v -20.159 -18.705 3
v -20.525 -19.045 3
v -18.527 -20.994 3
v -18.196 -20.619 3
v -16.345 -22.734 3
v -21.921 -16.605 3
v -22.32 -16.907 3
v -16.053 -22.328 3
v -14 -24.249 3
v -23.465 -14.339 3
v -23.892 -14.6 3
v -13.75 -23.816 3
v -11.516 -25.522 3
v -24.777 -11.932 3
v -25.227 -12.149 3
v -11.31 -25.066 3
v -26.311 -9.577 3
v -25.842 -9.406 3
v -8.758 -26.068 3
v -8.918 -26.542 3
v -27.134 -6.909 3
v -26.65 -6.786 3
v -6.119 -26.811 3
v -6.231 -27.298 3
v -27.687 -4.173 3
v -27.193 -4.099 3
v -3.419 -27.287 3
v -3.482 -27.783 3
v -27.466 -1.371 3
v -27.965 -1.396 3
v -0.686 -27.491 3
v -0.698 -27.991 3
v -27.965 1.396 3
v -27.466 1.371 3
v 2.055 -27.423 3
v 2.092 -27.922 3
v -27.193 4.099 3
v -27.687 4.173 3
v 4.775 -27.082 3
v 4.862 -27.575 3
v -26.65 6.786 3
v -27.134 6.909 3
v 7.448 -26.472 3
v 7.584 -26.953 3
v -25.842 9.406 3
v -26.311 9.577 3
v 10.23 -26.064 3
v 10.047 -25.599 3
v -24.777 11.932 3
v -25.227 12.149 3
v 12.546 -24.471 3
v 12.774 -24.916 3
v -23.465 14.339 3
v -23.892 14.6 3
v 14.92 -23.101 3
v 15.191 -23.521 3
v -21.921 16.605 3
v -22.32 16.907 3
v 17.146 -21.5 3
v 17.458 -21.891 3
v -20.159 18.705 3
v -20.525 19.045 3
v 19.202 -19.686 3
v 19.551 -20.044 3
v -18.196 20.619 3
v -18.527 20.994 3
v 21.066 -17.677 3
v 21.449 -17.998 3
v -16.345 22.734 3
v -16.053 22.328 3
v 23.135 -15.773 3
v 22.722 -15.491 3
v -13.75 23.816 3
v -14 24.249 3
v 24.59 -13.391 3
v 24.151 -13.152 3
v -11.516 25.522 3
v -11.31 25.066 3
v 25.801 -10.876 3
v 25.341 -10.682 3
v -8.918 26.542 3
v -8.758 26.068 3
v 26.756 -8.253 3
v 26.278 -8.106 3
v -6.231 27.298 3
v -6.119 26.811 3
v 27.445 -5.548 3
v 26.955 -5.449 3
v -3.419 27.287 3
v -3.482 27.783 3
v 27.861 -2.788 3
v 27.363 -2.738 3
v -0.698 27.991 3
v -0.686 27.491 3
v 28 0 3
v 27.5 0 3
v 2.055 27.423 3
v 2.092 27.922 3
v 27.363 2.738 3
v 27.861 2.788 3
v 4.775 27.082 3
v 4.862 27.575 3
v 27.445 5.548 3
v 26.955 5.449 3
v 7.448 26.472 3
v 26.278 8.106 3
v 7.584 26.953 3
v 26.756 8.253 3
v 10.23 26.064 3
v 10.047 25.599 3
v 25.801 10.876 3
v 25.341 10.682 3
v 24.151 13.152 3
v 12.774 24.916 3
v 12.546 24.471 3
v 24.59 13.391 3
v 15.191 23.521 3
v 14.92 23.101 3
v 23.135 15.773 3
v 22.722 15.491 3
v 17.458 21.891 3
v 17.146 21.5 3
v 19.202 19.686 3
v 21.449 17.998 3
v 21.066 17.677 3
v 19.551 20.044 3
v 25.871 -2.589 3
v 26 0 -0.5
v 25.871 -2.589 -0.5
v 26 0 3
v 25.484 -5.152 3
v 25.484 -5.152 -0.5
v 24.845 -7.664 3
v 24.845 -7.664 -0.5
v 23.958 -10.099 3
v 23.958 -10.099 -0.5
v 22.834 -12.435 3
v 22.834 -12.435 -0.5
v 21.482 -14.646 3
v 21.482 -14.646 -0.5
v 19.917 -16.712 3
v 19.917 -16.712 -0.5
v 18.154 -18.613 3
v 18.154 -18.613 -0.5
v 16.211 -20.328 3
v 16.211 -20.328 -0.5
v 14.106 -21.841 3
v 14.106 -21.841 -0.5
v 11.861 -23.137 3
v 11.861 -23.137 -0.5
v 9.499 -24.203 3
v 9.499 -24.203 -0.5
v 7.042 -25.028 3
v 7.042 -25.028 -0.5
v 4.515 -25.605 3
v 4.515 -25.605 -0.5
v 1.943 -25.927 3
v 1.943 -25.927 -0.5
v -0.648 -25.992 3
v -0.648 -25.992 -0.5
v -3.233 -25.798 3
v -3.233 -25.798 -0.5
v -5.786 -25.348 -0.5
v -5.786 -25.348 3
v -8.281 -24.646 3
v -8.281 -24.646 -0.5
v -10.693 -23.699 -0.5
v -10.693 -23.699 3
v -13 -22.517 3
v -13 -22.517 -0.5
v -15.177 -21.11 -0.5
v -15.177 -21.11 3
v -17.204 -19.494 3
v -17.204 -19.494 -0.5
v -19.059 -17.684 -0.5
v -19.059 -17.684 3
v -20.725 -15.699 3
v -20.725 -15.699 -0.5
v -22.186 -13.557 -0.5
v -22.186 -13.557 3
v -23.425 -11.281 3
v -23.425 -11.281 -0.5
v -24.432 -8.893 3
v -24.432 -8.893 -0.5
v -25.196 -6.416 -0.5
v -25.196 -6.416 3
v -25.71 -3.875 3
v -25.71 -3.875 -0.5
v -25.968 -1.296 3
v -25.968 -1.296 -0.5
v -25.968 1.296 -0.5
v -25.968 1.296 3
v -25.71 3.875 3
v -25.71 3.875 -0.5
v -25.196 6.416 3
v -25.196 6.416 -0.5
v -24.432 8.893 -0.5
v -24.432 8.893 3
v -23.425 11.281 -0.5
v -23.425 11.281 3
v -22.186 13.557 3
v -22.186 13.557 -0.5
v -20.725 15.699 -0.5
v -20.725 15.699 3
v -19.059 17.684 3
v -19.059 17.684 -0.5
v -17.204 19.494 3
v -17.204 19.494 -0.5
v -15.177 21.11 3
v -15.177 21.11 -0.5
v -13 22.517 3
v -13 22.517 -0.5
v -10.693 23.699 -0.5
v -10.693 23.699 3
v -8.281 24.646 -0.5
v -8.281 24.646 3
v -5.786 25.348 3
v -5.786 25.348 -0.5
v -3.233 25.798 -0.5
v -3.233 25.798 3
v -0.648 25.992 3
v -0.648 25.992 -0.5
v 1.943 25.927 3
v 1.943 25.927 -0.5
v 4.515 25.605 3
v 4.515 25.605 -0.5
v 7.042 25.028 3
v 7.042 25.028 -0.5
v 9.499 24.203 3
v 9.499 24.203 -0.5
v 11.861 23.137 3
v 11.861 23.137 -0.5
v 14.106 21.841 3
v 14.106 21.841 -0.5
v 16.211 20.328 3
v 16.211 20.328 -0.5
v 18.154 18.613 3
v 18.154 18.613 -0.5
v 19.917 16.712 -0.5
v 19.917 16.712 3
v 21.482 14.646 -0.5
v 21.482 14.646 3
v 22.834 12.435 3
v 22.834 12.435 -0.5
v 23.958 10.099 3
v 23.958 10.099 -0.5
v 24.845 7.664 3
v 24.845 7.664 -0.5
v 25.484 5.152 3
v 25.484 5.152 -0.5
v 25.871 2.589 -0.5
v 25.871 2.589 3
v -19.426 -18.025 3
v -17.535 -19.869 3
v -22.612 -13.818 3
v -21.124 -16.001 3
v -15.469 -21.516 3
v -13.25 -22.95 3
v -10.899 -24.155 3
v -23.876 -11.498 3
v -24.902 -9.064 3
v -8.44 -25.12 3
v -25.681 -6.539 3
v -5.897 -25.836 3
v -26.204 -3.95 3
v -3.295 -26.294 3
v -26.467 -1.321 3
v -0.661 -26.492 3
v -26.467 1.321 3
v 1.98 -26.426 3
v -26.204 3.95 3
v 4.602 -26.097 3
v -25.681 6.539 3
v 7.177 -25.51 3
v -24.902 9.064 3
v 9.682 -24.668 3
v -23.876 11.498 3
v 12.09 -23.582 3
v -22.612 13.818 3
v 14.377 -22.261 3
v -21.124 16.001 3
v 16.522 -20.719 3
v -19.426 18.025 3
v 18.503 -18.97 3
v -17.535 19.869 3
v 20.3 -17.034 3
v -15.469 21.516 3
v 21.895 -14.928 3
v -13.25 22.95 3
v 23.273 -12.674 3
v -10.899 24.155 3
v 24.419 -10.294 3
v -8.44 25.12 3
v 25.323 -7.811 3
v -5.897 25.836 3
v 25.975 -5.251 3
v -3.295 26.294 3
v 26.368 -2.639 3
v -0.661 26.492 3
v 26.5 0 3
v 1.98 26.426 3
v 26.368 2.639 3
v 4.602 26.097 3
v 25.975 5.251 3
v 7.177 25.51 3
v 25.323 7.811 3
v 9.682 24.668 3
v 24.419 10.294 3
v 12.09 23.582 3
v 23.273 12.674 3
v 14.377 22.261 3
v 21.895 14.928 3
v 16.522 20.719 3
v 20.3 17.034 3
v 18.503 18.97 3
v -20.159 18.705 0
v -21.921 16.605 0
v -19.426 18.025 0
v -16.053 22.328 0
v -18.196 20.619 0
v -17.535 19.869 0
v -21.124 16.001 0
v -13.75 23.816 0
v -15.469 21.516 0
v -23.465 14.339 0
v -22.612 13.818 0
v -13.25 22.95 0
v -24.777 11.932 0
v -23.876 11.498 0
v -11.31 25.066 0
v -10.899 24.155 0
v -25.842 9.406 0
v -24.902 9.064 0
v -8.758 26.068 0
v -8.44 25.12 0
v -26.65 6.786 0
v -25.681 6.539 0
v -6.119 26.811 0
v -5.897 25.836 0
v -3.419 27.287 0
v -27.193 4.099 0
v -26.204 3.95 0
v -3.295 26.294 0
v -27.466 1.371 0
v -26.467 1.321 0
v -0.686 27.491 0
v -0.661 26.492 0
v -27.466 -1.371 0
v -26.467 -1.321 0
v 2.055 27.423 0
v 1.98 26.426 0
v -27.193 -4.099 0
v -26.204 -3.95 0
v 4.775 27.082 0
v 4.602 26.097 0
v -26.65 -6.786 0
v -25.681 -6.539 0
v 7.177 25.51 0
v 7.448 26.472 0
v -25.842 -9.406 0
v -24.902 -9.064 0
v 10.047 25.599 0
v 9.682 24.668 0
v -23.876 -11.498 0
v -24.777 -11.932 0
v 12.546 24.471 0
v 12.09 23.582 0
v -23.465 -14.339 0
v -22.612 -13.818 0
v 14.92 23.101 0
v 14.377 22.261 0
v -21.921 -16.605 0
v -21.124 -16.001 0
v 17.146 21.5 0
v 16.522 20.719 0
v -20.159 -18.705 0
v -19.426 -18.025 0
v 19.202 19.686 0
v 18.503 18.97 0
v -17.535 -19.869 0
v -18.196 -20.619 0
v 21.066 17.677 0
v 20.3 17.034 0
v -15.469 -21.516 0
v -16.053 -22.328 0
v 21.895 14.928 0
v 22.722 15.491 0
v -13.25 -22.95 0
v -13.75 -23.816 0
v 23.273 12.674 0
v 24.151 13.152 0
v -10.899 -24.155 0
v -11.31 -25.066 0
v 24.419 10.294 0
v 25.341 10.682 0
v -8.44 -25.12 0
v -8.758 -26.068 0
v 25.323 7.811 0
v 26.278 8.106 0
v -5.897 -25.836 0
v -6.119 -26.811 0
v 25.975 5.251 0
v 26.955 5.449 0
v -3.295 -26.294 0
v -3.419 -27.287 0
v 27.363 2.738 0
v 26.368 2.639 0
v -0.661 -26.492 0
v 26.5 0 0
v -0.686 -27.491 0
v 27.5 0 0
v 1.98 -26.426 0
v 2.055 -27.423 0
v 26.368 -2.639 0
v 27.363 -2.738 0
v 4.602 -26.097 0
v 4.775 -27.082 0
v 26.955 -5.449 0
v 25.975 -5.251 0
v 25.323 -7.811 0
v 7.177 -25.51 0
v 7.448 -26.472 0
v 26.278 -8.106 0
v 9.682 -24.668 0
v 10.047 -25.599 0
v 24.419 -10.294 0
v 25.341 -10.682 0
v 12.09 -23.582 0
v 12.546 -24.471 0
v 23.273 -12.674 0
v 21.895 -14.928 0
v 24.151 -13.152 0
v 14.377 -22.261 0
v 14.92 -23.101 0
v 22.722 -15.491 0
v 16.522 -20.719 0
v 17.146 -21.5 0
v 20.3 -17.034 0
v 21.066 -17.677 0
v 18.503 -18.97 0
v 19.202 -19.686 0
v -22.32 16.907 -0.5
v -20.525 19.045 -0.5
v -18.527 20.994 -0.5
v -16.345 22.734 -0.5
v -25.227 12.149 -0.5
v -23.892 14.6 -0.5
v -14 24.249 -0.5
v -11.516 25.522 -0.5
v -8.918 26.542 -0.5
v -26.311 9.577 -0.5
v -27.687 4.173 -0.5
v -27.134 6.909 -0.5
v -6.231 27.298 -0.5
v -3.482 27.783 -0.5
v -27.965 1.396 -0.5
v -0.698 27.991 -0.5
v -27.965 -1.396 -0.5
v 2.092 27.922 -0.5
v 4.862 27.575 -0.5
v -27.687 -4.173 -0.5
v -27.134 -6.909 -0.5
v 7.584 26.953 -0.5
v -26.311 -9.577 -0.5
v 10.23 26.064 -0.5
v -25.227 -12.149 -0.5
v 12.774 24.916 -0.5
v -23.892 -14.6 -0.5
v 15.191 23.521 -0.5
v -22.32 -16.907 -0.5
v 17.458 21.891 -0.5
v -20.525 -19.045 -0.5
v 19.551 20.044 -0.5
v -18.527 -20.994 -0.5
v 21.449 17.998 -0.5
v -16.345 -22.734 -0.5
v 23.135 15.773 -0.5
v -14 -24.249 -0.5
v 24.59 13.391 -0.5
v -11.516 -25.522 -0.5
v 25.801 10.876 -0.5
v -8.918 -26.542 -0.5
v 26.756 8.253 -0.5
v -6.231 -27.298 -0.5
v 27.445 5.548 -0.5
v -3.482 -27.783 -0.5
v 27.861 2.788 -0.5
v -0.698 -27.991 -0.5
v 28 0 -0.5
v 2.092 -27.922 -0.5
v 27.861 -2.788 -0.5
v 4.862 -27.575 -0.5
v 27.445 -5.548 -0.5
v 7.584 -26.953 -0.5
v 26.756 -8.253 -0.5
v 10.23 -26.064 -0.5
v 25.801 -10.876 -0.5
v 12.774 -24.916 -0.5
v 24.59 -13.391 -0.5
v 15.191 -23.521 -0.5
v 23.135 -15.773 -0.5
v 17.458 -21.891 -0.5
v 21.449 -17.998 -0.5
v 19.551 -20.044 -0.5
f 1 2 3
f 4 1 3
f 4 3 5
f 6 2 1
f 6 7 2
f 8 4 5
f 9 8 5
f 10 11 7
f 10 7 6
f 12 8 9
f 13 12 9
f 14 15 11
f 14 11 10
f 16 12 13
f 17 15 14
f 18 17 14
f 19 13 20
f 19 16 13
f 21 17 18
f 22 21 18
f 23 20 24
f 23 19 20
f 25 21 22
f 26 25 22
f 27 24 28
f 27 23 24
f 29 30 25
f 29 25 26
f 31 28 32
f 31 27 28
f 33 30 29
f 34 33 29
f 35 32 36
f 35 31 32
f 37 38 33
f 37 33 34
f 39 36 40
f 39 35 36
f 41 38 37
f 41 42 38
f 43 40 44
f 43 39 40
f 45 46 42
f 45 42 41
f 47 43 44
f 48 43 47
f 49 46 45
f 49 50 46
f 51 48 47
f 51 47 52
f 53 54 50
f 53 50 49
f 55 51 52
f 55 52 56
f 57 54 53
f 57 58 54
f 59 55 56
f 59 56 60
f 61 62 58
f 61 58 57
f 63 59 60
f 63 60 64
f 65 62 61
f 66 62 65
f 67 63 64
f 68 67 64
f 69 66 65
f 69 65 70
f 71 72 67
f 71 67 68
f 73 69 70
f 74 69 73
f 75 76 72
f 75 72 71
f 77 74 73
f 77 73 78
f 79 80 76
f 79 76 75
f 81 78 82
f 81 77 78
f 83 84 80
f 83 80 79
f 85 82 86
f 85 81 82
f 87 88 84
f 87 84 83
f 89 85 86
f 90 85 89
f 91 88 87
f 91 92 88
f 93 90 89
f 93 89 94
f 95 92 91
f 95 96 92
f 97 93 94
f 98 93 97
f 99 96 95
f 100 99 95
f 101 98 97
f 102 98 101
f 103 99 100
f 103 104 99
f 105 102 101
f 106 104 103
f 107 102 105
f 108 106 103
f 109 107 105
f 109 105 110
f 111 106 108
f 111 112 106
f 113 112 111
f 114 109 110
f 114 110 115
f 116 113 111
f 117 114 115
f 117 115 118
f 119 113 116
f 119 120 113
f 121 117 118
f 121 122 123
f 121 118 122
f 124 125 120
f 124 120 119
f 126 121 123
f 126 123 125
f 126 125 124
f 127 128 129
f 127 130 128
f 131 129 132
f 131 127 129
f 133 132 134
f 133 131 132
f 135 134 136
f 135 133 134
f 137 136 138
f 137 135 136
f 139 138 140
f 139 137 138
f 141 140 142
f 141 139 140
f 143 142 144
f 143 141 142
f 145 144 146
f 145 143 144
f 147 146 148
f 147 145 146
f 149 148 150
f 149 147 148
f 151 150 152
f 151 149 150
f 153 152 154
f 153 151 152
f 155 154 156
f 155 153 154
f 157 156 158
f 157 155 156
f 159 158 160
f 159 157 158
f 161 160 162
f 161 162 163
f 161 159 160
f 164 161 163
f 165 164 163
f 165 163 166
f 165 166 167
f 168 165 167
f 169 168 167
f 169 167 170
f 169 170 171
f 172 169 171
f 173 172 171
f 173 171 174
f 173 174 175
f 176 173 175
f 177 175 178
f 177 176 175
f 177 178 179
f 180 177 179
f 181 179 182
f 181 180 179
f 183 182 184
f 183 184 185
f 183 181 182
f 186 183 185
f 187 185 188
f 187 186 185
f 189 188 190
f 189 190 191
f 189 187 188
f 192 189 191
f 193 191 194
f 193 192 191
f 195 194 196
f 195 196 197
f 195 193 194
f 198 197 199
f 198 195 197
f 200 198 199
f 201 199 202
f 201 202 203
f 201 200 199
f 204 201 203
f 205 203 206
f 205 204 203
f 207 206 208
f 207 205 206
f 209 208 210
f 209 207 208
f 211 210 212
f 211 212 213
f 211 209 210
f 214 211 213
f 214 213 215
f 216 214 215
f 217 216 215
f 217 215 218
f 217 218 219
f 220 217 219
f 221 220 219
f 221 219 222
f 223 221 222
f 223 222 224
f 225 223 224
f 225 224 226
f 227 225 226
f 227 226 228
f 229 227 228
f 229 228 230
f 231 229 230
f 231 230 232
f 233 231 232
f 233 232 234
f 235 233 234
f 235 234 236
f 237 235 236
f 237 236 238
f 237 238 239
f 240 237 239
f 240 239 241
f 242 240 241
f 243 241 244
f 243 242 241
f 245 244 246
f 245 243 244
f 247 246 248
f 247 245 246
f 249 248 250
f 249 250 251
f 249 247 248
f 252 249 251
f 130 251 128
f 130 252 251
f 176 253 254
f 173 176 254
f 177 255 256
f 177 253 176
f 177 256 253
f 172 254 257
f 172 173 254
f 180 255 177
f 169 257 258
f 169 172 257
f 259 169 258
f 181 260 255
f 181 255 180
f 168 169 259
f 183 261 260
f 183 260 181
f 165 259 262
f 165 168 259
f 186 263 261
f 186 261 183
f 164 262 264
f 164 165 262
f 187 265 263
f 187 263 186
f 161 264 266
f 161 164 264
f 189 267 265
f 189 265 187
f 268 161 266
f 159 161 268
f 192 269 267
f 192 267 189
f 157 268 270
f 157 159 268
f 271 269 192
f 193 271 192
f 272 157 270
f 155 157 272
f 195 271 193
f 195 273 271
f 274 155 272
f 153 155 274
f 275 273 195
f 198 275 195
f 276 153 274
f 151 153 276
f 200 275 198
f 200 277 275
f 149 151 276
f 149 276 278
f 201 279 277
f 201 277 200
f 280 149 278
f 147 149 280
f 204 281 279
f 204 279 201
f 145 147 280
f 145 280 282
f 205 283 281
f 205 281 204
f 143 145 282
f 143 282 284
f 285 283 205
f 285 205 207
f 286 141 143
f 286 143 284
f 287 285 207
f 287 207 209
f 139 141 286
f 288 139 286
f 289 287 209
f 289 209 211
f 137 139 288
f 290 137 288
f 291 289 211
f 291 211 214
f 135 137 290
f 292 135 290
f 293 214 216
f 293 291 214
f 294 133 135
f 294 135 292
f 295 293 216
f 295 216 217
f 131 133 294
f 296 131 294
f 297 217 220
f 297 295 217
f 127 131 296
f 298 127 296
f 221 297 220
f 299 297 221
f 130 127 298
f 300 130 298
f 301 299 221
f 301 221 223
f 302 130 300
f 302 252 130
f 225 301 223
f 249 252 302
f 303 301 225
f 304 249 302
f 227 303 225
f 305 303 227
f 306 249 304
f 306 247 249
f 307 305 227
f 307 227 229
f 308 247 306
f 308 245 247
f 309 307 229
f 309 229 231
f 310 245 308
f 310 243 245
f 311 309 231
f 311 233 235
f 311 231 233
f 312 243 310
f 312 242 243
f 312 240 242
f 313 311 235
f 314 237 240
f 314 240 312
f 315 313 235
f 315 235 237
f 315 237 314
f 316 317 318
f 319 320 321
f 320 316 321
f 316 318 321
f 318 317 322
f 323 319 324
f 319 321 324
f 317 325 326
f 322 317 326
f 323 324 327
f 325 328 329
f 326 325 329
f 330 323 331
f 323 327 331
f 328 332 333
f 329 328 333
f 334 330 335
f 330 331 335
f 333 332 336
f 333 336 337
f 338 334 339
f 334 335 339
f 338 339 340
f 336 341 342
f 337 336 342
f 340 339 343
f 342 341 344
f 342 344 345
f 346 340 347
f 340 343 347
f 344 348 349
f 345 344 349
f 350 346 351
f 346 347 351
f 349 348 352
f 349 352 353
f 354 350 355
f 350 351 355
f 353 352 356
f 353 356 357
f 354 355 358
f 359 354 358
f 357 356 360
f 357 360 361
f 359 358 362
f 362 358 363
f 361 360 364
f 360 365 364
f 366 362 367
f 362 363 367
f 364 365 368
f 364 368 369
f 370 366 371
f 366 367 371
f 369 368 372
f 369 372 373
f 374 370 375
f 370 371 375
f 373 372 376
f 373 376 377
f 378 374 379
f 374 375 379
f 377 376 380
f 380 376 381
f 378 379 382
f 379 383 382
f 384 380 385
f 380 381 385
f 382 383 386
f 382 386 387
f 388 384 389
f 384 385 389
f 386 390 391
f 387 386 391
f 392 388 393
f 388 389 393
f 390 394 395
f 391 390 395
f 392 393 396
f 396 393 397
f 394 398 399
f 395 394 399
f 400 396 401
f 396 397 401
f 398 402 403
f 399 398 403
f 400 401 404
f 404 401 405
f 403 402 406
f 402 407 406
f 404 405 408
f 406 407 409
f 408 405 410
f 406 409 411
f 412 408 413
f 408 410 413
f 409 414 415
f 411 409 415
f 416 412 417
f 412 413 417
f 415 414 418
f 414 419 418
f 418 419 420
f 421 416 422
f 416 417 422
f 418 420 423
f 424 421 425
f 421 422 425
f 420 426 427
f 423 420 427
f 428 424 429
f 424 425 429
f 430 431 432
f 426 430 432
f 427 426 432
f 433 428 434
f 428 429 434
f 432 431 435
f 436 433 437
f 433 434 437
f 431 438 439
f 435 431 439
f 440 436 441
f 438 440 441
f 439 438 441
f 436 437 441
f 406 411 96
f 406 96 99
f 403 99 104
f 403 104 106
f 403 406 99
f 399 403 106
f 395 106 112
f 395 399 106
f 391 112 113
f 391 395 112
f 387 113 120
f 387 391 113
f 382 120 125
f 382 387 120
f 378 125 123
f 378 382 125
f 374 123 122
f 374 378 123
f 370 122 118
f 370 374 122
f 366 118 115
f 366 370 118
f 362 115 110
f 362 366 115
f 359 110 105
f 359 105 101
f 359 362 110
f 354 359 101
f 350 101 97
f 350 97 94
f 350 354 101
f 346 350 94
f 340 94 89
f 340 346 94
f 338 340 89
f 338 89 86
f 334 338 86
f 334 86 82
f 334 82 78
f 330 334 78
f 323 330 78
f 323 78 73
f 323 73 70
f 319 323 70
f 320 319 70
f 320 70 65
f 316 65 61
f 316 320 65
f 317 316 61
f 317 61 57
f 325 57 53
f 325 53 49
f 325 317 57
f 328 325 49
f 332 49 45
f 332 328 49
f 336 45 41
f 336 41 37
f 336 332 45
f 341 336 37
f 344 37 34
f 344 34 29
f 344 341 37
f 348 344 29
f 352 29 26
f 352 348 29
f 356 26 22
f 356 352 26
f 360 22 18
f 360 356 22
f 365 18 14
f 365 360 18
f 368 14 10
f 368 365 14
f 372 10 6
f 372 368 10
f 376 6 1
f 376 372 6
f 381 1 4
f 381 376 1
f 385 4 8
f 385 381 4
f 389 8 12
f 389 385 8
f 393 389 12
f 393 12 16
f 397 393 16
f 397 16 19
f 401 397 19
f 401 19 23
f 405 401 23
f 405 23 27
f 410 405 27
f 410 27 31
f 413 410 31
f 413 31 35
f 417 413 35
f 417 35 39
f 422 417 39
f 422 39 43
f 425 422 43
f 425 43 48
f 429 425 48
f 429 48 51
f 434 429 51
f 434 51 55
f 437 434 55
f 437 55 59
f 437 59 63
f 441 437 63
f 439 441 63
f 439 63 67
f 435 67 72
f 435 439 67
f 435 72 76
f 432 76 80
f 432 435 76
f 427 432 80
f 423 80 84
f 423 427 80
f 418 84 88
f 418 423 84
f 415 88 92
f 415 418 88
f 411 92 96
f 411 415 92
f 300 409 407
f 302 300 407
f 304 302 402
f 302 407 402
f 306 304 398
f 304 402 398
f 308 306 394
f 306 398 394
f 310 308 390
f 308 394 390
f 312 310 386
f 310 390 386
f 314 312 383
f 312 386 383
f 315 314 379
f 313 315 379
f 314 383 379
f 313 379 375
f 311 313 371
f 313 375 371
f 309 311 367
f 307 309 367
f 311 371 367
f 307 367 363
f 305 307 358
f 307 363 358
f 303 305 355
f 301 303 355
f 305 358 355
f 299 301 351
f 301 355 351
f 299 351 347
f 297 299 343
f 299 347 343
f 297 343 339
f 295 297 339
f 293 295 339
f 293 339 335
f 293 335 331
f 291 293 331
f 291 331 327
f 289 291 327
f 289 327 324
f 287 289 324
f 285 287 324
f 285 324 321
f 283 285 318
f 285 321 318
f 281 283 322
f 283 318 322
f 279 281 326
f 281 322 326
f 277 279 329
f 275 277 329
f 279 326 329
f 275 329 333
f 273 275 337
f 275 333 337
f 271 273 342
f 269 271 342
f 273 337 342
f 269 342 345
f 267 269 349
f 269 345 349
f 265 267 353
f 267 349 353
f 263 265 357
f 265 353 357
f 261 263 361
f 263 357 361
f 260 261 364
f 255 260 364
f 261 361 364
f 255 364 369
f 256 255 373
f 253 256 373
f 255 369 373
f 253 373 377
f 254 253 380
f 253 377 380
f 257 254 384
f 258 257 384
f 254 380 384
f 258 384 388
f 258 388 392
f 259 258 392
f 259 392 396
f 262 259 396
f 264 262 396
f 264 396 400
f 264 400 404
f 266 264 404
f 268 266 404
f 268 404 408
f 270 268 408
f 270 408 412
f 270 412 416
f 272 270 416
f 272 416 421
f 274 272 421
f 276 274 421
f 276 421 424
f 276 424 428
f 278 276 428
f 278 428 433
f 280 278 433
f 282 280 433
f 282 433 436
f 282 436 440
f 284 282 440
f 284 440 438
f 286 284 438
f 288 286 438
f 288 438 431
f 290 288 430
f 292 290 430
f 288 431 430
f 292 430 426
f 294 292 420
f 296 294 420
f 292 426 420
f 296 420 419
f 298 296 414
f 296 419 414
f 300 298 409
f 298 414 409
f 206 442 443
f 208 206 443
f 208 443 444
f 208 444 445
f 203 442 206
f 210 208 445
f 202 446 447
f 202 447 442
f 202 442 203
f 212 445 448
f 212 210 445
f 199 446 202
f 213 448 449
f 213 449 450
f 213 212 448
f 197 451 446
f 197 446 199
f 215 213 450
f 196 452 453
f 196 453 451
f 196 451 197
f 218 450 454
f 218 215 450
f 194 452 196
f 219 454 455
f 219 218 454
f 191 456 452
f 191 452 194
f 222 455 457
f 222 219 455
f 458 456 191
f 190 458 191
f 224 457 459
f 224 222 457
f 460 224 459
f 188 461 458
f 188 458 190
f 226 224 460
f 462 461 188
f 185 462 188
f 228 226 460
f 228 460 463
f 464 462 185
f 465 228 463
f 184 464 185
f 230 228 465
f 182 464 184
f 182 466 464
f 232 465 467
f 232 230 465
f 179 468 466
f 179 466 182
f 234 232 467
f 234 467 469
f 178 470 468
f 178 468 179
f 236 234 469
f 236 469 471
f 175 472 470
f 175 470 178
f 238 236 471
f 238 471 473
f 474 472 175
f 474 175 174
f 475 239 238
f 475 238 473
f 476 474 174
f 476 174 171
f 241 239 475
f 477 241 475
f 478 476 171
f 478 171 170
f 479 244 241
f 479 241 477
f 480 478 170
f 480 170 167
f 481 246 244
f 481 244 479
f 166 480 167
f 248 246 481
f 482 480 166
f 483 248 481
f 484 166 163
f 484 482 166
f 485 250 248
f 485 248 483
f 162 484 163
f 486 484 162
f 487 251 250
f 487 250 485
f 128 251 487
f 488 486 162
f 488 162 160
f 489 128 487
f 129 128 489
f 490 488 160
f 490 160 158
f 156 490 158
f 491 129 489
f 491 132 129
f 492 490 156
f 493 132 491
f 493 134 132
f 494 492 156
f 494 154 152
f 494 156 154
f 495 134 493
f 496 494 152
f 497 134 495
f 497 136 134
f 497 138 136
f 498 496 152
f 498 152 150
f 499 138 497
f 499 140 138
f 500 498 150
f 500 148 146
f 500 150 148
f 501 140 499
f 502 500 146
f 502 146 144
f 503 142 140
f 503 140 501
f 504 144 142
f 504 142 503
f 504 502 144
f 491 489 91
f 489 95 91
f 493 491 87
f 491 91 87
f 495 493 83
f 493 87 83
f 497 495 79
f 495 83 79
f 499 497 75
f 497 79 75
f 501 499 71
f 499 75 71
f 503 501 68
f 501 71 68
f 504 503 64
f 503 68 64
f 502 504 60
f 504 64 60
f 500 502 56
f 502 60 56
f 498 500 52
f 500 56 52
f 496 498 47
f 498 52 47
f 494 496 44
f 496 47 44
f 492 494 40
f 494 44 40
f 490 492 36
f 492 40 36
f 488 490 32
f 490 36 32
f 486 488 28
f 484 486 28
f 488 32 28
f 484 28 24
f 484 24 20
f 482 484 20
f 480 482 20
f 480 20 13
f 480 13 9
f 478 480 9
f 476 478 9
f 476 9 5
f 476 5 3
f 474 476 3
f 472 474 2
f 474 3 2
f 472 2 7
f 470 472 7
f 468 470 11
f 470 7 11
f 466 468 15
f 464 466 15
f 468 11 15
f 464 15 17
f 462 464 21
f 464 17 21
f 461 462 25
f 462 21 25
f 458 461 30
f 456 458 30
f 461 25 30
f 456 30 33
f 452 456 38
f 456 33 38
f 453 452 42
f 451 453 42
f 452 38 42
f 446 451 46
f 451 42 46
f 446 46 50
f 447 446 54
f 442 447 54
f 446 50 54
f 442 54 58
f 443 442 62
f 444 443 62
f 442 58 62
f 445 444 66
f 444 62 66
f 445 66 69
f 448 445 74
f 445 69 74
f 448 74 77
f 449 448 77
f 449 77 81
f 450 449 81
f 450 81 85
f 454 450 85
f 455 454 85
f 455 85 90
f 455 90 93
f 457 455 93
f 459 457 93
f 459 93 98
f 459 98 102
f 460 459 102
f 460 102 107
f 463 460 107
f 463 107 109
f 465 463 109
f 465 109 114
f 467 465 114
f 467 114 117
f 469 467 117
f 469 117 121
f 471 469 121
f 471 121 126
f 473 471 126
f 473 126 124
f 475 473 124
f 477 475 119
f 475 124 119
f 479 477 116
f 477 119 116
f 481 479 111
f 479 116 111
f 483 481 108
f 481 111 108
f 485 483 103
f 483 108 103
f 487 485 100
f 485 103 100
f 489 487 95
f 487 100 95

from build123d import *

# Parameters (mm, degrees)
F0_R     = 28
F0_R_2   = 27.5
F0_R_3   = 26.5
F0_R_4   = 26
F1_DEPTH = 3
F2_R     = 28
F2_R_2   = 26
F3_DEPTH = 0.5


with BuildPart() as f1:
    # F0 (on Top) → F1 (new body)
    with BuildSketch(Plane.XY):
        Circle(F0_R)
        Circle(F0_R_2, mode=Mode.SUBTRACT)
        Circle(F0_R_3)
        Circle(F0_R_4, mode=Mode.SUBTRACT)
    extrude(amount=F1_DEPTH)

    # F2 (on face) → F3 (join)
    with BuildSketch(Plane(origin=(0, 0, 0), x_dir=(1, 0, 0), z_dir=(0, 0, -1))):
        Circle(F2_R)
        Circle(F2_R_2, mode=Mode.SUBTRACT)
    extrude(amount=F3_DEPTH)


solid = f1.part
